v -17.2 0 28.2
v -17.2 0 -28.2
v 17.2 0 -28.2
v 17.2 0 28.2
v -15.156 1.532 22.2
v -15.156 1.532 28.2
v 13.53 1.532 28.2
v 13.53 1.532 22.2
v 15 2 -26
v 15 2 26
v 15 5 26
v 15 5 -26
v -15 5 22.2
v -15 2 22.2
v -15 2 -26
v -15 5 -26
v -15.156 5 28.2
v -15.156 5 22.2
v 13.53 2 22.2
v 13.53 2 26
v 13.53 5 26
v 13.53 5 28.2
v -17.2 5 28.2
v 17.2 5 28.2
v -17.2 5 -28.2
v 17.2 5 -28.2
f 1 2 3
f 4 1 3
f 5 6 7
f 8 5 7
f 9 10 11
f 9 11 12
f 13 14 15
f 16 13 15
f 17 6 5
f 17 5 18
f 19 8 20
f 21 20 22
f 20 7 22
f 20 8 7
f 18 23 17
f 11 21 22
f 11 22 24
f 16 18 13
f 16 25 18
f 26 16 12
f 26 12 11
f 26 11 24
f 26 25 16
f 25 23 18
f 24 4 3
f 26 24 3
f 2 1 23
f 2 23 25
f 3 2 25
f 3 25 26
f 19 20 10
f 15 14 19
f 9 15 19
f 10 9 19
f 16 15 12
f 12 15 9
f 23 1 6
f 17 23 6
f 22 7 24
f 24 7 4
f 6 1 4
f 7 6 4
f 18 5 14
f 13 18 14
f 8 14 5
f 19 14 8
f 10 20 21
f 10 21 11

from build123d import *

# Parameters (mm, degrees)
SKETCH2_W           = 30
SKETCH2_H           = 52
BOSS_EXTRUDE1_DEPTH = 2
SKETCH2_3_W         = 34.4
SKETCH2_3_H         = 56.4
SKETCH2_3_W_2       = 30
SKETCH2_3_H_2       = 52
BOSS_EXTRUDE2_DEPTH = 5
SKETCH3_W           = 28.685719202
SKETCH3_H           = 4.374860236
CUT_EXTRUDE1_DEPTH  = 6


with BuildPart() as part:
    # Sketch2 → Boss-Extrude1 (new body)
    with BuildSketch(Plane(origin=(0, 0, 0), x_dir=(1, 0, 0), z_dir=(0, 1, 0))):
        Rectangle(SKETCH2_W, SKETCH2_H)
    extrude(amount=BOSS_EXTRUDE1_DEPTH)

    # Sketch2<3> → Boss-Extrude2 (add)
    with BuildSketch(Plane(origin=(0, 0, 0), x_dir=(1, 0, 0), z_dir=(0, 1, 0))):
        Rectangle(SKETCH2_3_W, SKETCH2_3_H)
        Rectangle(SKETCH2_3_W_2, SKETCH2_3_H_2, mode=Mode.SUBTRACT)
    extrude(amount=BOSS_EXTRUDE2_DEPTH)

    # Sketch3 → Cut-Extrude1 (cut)
    with BuildSketch(Plane.XY.offset(28.2)):
        with Locations((-0.813326627, 3.719763482)):
            Rectangle(SKETCH3_W, SKETCH3_H)
    extrude(amount=-CUT_EXTRUDE1_DEPTH, mode=Mode.SUBTRACT)


solid = part.part
